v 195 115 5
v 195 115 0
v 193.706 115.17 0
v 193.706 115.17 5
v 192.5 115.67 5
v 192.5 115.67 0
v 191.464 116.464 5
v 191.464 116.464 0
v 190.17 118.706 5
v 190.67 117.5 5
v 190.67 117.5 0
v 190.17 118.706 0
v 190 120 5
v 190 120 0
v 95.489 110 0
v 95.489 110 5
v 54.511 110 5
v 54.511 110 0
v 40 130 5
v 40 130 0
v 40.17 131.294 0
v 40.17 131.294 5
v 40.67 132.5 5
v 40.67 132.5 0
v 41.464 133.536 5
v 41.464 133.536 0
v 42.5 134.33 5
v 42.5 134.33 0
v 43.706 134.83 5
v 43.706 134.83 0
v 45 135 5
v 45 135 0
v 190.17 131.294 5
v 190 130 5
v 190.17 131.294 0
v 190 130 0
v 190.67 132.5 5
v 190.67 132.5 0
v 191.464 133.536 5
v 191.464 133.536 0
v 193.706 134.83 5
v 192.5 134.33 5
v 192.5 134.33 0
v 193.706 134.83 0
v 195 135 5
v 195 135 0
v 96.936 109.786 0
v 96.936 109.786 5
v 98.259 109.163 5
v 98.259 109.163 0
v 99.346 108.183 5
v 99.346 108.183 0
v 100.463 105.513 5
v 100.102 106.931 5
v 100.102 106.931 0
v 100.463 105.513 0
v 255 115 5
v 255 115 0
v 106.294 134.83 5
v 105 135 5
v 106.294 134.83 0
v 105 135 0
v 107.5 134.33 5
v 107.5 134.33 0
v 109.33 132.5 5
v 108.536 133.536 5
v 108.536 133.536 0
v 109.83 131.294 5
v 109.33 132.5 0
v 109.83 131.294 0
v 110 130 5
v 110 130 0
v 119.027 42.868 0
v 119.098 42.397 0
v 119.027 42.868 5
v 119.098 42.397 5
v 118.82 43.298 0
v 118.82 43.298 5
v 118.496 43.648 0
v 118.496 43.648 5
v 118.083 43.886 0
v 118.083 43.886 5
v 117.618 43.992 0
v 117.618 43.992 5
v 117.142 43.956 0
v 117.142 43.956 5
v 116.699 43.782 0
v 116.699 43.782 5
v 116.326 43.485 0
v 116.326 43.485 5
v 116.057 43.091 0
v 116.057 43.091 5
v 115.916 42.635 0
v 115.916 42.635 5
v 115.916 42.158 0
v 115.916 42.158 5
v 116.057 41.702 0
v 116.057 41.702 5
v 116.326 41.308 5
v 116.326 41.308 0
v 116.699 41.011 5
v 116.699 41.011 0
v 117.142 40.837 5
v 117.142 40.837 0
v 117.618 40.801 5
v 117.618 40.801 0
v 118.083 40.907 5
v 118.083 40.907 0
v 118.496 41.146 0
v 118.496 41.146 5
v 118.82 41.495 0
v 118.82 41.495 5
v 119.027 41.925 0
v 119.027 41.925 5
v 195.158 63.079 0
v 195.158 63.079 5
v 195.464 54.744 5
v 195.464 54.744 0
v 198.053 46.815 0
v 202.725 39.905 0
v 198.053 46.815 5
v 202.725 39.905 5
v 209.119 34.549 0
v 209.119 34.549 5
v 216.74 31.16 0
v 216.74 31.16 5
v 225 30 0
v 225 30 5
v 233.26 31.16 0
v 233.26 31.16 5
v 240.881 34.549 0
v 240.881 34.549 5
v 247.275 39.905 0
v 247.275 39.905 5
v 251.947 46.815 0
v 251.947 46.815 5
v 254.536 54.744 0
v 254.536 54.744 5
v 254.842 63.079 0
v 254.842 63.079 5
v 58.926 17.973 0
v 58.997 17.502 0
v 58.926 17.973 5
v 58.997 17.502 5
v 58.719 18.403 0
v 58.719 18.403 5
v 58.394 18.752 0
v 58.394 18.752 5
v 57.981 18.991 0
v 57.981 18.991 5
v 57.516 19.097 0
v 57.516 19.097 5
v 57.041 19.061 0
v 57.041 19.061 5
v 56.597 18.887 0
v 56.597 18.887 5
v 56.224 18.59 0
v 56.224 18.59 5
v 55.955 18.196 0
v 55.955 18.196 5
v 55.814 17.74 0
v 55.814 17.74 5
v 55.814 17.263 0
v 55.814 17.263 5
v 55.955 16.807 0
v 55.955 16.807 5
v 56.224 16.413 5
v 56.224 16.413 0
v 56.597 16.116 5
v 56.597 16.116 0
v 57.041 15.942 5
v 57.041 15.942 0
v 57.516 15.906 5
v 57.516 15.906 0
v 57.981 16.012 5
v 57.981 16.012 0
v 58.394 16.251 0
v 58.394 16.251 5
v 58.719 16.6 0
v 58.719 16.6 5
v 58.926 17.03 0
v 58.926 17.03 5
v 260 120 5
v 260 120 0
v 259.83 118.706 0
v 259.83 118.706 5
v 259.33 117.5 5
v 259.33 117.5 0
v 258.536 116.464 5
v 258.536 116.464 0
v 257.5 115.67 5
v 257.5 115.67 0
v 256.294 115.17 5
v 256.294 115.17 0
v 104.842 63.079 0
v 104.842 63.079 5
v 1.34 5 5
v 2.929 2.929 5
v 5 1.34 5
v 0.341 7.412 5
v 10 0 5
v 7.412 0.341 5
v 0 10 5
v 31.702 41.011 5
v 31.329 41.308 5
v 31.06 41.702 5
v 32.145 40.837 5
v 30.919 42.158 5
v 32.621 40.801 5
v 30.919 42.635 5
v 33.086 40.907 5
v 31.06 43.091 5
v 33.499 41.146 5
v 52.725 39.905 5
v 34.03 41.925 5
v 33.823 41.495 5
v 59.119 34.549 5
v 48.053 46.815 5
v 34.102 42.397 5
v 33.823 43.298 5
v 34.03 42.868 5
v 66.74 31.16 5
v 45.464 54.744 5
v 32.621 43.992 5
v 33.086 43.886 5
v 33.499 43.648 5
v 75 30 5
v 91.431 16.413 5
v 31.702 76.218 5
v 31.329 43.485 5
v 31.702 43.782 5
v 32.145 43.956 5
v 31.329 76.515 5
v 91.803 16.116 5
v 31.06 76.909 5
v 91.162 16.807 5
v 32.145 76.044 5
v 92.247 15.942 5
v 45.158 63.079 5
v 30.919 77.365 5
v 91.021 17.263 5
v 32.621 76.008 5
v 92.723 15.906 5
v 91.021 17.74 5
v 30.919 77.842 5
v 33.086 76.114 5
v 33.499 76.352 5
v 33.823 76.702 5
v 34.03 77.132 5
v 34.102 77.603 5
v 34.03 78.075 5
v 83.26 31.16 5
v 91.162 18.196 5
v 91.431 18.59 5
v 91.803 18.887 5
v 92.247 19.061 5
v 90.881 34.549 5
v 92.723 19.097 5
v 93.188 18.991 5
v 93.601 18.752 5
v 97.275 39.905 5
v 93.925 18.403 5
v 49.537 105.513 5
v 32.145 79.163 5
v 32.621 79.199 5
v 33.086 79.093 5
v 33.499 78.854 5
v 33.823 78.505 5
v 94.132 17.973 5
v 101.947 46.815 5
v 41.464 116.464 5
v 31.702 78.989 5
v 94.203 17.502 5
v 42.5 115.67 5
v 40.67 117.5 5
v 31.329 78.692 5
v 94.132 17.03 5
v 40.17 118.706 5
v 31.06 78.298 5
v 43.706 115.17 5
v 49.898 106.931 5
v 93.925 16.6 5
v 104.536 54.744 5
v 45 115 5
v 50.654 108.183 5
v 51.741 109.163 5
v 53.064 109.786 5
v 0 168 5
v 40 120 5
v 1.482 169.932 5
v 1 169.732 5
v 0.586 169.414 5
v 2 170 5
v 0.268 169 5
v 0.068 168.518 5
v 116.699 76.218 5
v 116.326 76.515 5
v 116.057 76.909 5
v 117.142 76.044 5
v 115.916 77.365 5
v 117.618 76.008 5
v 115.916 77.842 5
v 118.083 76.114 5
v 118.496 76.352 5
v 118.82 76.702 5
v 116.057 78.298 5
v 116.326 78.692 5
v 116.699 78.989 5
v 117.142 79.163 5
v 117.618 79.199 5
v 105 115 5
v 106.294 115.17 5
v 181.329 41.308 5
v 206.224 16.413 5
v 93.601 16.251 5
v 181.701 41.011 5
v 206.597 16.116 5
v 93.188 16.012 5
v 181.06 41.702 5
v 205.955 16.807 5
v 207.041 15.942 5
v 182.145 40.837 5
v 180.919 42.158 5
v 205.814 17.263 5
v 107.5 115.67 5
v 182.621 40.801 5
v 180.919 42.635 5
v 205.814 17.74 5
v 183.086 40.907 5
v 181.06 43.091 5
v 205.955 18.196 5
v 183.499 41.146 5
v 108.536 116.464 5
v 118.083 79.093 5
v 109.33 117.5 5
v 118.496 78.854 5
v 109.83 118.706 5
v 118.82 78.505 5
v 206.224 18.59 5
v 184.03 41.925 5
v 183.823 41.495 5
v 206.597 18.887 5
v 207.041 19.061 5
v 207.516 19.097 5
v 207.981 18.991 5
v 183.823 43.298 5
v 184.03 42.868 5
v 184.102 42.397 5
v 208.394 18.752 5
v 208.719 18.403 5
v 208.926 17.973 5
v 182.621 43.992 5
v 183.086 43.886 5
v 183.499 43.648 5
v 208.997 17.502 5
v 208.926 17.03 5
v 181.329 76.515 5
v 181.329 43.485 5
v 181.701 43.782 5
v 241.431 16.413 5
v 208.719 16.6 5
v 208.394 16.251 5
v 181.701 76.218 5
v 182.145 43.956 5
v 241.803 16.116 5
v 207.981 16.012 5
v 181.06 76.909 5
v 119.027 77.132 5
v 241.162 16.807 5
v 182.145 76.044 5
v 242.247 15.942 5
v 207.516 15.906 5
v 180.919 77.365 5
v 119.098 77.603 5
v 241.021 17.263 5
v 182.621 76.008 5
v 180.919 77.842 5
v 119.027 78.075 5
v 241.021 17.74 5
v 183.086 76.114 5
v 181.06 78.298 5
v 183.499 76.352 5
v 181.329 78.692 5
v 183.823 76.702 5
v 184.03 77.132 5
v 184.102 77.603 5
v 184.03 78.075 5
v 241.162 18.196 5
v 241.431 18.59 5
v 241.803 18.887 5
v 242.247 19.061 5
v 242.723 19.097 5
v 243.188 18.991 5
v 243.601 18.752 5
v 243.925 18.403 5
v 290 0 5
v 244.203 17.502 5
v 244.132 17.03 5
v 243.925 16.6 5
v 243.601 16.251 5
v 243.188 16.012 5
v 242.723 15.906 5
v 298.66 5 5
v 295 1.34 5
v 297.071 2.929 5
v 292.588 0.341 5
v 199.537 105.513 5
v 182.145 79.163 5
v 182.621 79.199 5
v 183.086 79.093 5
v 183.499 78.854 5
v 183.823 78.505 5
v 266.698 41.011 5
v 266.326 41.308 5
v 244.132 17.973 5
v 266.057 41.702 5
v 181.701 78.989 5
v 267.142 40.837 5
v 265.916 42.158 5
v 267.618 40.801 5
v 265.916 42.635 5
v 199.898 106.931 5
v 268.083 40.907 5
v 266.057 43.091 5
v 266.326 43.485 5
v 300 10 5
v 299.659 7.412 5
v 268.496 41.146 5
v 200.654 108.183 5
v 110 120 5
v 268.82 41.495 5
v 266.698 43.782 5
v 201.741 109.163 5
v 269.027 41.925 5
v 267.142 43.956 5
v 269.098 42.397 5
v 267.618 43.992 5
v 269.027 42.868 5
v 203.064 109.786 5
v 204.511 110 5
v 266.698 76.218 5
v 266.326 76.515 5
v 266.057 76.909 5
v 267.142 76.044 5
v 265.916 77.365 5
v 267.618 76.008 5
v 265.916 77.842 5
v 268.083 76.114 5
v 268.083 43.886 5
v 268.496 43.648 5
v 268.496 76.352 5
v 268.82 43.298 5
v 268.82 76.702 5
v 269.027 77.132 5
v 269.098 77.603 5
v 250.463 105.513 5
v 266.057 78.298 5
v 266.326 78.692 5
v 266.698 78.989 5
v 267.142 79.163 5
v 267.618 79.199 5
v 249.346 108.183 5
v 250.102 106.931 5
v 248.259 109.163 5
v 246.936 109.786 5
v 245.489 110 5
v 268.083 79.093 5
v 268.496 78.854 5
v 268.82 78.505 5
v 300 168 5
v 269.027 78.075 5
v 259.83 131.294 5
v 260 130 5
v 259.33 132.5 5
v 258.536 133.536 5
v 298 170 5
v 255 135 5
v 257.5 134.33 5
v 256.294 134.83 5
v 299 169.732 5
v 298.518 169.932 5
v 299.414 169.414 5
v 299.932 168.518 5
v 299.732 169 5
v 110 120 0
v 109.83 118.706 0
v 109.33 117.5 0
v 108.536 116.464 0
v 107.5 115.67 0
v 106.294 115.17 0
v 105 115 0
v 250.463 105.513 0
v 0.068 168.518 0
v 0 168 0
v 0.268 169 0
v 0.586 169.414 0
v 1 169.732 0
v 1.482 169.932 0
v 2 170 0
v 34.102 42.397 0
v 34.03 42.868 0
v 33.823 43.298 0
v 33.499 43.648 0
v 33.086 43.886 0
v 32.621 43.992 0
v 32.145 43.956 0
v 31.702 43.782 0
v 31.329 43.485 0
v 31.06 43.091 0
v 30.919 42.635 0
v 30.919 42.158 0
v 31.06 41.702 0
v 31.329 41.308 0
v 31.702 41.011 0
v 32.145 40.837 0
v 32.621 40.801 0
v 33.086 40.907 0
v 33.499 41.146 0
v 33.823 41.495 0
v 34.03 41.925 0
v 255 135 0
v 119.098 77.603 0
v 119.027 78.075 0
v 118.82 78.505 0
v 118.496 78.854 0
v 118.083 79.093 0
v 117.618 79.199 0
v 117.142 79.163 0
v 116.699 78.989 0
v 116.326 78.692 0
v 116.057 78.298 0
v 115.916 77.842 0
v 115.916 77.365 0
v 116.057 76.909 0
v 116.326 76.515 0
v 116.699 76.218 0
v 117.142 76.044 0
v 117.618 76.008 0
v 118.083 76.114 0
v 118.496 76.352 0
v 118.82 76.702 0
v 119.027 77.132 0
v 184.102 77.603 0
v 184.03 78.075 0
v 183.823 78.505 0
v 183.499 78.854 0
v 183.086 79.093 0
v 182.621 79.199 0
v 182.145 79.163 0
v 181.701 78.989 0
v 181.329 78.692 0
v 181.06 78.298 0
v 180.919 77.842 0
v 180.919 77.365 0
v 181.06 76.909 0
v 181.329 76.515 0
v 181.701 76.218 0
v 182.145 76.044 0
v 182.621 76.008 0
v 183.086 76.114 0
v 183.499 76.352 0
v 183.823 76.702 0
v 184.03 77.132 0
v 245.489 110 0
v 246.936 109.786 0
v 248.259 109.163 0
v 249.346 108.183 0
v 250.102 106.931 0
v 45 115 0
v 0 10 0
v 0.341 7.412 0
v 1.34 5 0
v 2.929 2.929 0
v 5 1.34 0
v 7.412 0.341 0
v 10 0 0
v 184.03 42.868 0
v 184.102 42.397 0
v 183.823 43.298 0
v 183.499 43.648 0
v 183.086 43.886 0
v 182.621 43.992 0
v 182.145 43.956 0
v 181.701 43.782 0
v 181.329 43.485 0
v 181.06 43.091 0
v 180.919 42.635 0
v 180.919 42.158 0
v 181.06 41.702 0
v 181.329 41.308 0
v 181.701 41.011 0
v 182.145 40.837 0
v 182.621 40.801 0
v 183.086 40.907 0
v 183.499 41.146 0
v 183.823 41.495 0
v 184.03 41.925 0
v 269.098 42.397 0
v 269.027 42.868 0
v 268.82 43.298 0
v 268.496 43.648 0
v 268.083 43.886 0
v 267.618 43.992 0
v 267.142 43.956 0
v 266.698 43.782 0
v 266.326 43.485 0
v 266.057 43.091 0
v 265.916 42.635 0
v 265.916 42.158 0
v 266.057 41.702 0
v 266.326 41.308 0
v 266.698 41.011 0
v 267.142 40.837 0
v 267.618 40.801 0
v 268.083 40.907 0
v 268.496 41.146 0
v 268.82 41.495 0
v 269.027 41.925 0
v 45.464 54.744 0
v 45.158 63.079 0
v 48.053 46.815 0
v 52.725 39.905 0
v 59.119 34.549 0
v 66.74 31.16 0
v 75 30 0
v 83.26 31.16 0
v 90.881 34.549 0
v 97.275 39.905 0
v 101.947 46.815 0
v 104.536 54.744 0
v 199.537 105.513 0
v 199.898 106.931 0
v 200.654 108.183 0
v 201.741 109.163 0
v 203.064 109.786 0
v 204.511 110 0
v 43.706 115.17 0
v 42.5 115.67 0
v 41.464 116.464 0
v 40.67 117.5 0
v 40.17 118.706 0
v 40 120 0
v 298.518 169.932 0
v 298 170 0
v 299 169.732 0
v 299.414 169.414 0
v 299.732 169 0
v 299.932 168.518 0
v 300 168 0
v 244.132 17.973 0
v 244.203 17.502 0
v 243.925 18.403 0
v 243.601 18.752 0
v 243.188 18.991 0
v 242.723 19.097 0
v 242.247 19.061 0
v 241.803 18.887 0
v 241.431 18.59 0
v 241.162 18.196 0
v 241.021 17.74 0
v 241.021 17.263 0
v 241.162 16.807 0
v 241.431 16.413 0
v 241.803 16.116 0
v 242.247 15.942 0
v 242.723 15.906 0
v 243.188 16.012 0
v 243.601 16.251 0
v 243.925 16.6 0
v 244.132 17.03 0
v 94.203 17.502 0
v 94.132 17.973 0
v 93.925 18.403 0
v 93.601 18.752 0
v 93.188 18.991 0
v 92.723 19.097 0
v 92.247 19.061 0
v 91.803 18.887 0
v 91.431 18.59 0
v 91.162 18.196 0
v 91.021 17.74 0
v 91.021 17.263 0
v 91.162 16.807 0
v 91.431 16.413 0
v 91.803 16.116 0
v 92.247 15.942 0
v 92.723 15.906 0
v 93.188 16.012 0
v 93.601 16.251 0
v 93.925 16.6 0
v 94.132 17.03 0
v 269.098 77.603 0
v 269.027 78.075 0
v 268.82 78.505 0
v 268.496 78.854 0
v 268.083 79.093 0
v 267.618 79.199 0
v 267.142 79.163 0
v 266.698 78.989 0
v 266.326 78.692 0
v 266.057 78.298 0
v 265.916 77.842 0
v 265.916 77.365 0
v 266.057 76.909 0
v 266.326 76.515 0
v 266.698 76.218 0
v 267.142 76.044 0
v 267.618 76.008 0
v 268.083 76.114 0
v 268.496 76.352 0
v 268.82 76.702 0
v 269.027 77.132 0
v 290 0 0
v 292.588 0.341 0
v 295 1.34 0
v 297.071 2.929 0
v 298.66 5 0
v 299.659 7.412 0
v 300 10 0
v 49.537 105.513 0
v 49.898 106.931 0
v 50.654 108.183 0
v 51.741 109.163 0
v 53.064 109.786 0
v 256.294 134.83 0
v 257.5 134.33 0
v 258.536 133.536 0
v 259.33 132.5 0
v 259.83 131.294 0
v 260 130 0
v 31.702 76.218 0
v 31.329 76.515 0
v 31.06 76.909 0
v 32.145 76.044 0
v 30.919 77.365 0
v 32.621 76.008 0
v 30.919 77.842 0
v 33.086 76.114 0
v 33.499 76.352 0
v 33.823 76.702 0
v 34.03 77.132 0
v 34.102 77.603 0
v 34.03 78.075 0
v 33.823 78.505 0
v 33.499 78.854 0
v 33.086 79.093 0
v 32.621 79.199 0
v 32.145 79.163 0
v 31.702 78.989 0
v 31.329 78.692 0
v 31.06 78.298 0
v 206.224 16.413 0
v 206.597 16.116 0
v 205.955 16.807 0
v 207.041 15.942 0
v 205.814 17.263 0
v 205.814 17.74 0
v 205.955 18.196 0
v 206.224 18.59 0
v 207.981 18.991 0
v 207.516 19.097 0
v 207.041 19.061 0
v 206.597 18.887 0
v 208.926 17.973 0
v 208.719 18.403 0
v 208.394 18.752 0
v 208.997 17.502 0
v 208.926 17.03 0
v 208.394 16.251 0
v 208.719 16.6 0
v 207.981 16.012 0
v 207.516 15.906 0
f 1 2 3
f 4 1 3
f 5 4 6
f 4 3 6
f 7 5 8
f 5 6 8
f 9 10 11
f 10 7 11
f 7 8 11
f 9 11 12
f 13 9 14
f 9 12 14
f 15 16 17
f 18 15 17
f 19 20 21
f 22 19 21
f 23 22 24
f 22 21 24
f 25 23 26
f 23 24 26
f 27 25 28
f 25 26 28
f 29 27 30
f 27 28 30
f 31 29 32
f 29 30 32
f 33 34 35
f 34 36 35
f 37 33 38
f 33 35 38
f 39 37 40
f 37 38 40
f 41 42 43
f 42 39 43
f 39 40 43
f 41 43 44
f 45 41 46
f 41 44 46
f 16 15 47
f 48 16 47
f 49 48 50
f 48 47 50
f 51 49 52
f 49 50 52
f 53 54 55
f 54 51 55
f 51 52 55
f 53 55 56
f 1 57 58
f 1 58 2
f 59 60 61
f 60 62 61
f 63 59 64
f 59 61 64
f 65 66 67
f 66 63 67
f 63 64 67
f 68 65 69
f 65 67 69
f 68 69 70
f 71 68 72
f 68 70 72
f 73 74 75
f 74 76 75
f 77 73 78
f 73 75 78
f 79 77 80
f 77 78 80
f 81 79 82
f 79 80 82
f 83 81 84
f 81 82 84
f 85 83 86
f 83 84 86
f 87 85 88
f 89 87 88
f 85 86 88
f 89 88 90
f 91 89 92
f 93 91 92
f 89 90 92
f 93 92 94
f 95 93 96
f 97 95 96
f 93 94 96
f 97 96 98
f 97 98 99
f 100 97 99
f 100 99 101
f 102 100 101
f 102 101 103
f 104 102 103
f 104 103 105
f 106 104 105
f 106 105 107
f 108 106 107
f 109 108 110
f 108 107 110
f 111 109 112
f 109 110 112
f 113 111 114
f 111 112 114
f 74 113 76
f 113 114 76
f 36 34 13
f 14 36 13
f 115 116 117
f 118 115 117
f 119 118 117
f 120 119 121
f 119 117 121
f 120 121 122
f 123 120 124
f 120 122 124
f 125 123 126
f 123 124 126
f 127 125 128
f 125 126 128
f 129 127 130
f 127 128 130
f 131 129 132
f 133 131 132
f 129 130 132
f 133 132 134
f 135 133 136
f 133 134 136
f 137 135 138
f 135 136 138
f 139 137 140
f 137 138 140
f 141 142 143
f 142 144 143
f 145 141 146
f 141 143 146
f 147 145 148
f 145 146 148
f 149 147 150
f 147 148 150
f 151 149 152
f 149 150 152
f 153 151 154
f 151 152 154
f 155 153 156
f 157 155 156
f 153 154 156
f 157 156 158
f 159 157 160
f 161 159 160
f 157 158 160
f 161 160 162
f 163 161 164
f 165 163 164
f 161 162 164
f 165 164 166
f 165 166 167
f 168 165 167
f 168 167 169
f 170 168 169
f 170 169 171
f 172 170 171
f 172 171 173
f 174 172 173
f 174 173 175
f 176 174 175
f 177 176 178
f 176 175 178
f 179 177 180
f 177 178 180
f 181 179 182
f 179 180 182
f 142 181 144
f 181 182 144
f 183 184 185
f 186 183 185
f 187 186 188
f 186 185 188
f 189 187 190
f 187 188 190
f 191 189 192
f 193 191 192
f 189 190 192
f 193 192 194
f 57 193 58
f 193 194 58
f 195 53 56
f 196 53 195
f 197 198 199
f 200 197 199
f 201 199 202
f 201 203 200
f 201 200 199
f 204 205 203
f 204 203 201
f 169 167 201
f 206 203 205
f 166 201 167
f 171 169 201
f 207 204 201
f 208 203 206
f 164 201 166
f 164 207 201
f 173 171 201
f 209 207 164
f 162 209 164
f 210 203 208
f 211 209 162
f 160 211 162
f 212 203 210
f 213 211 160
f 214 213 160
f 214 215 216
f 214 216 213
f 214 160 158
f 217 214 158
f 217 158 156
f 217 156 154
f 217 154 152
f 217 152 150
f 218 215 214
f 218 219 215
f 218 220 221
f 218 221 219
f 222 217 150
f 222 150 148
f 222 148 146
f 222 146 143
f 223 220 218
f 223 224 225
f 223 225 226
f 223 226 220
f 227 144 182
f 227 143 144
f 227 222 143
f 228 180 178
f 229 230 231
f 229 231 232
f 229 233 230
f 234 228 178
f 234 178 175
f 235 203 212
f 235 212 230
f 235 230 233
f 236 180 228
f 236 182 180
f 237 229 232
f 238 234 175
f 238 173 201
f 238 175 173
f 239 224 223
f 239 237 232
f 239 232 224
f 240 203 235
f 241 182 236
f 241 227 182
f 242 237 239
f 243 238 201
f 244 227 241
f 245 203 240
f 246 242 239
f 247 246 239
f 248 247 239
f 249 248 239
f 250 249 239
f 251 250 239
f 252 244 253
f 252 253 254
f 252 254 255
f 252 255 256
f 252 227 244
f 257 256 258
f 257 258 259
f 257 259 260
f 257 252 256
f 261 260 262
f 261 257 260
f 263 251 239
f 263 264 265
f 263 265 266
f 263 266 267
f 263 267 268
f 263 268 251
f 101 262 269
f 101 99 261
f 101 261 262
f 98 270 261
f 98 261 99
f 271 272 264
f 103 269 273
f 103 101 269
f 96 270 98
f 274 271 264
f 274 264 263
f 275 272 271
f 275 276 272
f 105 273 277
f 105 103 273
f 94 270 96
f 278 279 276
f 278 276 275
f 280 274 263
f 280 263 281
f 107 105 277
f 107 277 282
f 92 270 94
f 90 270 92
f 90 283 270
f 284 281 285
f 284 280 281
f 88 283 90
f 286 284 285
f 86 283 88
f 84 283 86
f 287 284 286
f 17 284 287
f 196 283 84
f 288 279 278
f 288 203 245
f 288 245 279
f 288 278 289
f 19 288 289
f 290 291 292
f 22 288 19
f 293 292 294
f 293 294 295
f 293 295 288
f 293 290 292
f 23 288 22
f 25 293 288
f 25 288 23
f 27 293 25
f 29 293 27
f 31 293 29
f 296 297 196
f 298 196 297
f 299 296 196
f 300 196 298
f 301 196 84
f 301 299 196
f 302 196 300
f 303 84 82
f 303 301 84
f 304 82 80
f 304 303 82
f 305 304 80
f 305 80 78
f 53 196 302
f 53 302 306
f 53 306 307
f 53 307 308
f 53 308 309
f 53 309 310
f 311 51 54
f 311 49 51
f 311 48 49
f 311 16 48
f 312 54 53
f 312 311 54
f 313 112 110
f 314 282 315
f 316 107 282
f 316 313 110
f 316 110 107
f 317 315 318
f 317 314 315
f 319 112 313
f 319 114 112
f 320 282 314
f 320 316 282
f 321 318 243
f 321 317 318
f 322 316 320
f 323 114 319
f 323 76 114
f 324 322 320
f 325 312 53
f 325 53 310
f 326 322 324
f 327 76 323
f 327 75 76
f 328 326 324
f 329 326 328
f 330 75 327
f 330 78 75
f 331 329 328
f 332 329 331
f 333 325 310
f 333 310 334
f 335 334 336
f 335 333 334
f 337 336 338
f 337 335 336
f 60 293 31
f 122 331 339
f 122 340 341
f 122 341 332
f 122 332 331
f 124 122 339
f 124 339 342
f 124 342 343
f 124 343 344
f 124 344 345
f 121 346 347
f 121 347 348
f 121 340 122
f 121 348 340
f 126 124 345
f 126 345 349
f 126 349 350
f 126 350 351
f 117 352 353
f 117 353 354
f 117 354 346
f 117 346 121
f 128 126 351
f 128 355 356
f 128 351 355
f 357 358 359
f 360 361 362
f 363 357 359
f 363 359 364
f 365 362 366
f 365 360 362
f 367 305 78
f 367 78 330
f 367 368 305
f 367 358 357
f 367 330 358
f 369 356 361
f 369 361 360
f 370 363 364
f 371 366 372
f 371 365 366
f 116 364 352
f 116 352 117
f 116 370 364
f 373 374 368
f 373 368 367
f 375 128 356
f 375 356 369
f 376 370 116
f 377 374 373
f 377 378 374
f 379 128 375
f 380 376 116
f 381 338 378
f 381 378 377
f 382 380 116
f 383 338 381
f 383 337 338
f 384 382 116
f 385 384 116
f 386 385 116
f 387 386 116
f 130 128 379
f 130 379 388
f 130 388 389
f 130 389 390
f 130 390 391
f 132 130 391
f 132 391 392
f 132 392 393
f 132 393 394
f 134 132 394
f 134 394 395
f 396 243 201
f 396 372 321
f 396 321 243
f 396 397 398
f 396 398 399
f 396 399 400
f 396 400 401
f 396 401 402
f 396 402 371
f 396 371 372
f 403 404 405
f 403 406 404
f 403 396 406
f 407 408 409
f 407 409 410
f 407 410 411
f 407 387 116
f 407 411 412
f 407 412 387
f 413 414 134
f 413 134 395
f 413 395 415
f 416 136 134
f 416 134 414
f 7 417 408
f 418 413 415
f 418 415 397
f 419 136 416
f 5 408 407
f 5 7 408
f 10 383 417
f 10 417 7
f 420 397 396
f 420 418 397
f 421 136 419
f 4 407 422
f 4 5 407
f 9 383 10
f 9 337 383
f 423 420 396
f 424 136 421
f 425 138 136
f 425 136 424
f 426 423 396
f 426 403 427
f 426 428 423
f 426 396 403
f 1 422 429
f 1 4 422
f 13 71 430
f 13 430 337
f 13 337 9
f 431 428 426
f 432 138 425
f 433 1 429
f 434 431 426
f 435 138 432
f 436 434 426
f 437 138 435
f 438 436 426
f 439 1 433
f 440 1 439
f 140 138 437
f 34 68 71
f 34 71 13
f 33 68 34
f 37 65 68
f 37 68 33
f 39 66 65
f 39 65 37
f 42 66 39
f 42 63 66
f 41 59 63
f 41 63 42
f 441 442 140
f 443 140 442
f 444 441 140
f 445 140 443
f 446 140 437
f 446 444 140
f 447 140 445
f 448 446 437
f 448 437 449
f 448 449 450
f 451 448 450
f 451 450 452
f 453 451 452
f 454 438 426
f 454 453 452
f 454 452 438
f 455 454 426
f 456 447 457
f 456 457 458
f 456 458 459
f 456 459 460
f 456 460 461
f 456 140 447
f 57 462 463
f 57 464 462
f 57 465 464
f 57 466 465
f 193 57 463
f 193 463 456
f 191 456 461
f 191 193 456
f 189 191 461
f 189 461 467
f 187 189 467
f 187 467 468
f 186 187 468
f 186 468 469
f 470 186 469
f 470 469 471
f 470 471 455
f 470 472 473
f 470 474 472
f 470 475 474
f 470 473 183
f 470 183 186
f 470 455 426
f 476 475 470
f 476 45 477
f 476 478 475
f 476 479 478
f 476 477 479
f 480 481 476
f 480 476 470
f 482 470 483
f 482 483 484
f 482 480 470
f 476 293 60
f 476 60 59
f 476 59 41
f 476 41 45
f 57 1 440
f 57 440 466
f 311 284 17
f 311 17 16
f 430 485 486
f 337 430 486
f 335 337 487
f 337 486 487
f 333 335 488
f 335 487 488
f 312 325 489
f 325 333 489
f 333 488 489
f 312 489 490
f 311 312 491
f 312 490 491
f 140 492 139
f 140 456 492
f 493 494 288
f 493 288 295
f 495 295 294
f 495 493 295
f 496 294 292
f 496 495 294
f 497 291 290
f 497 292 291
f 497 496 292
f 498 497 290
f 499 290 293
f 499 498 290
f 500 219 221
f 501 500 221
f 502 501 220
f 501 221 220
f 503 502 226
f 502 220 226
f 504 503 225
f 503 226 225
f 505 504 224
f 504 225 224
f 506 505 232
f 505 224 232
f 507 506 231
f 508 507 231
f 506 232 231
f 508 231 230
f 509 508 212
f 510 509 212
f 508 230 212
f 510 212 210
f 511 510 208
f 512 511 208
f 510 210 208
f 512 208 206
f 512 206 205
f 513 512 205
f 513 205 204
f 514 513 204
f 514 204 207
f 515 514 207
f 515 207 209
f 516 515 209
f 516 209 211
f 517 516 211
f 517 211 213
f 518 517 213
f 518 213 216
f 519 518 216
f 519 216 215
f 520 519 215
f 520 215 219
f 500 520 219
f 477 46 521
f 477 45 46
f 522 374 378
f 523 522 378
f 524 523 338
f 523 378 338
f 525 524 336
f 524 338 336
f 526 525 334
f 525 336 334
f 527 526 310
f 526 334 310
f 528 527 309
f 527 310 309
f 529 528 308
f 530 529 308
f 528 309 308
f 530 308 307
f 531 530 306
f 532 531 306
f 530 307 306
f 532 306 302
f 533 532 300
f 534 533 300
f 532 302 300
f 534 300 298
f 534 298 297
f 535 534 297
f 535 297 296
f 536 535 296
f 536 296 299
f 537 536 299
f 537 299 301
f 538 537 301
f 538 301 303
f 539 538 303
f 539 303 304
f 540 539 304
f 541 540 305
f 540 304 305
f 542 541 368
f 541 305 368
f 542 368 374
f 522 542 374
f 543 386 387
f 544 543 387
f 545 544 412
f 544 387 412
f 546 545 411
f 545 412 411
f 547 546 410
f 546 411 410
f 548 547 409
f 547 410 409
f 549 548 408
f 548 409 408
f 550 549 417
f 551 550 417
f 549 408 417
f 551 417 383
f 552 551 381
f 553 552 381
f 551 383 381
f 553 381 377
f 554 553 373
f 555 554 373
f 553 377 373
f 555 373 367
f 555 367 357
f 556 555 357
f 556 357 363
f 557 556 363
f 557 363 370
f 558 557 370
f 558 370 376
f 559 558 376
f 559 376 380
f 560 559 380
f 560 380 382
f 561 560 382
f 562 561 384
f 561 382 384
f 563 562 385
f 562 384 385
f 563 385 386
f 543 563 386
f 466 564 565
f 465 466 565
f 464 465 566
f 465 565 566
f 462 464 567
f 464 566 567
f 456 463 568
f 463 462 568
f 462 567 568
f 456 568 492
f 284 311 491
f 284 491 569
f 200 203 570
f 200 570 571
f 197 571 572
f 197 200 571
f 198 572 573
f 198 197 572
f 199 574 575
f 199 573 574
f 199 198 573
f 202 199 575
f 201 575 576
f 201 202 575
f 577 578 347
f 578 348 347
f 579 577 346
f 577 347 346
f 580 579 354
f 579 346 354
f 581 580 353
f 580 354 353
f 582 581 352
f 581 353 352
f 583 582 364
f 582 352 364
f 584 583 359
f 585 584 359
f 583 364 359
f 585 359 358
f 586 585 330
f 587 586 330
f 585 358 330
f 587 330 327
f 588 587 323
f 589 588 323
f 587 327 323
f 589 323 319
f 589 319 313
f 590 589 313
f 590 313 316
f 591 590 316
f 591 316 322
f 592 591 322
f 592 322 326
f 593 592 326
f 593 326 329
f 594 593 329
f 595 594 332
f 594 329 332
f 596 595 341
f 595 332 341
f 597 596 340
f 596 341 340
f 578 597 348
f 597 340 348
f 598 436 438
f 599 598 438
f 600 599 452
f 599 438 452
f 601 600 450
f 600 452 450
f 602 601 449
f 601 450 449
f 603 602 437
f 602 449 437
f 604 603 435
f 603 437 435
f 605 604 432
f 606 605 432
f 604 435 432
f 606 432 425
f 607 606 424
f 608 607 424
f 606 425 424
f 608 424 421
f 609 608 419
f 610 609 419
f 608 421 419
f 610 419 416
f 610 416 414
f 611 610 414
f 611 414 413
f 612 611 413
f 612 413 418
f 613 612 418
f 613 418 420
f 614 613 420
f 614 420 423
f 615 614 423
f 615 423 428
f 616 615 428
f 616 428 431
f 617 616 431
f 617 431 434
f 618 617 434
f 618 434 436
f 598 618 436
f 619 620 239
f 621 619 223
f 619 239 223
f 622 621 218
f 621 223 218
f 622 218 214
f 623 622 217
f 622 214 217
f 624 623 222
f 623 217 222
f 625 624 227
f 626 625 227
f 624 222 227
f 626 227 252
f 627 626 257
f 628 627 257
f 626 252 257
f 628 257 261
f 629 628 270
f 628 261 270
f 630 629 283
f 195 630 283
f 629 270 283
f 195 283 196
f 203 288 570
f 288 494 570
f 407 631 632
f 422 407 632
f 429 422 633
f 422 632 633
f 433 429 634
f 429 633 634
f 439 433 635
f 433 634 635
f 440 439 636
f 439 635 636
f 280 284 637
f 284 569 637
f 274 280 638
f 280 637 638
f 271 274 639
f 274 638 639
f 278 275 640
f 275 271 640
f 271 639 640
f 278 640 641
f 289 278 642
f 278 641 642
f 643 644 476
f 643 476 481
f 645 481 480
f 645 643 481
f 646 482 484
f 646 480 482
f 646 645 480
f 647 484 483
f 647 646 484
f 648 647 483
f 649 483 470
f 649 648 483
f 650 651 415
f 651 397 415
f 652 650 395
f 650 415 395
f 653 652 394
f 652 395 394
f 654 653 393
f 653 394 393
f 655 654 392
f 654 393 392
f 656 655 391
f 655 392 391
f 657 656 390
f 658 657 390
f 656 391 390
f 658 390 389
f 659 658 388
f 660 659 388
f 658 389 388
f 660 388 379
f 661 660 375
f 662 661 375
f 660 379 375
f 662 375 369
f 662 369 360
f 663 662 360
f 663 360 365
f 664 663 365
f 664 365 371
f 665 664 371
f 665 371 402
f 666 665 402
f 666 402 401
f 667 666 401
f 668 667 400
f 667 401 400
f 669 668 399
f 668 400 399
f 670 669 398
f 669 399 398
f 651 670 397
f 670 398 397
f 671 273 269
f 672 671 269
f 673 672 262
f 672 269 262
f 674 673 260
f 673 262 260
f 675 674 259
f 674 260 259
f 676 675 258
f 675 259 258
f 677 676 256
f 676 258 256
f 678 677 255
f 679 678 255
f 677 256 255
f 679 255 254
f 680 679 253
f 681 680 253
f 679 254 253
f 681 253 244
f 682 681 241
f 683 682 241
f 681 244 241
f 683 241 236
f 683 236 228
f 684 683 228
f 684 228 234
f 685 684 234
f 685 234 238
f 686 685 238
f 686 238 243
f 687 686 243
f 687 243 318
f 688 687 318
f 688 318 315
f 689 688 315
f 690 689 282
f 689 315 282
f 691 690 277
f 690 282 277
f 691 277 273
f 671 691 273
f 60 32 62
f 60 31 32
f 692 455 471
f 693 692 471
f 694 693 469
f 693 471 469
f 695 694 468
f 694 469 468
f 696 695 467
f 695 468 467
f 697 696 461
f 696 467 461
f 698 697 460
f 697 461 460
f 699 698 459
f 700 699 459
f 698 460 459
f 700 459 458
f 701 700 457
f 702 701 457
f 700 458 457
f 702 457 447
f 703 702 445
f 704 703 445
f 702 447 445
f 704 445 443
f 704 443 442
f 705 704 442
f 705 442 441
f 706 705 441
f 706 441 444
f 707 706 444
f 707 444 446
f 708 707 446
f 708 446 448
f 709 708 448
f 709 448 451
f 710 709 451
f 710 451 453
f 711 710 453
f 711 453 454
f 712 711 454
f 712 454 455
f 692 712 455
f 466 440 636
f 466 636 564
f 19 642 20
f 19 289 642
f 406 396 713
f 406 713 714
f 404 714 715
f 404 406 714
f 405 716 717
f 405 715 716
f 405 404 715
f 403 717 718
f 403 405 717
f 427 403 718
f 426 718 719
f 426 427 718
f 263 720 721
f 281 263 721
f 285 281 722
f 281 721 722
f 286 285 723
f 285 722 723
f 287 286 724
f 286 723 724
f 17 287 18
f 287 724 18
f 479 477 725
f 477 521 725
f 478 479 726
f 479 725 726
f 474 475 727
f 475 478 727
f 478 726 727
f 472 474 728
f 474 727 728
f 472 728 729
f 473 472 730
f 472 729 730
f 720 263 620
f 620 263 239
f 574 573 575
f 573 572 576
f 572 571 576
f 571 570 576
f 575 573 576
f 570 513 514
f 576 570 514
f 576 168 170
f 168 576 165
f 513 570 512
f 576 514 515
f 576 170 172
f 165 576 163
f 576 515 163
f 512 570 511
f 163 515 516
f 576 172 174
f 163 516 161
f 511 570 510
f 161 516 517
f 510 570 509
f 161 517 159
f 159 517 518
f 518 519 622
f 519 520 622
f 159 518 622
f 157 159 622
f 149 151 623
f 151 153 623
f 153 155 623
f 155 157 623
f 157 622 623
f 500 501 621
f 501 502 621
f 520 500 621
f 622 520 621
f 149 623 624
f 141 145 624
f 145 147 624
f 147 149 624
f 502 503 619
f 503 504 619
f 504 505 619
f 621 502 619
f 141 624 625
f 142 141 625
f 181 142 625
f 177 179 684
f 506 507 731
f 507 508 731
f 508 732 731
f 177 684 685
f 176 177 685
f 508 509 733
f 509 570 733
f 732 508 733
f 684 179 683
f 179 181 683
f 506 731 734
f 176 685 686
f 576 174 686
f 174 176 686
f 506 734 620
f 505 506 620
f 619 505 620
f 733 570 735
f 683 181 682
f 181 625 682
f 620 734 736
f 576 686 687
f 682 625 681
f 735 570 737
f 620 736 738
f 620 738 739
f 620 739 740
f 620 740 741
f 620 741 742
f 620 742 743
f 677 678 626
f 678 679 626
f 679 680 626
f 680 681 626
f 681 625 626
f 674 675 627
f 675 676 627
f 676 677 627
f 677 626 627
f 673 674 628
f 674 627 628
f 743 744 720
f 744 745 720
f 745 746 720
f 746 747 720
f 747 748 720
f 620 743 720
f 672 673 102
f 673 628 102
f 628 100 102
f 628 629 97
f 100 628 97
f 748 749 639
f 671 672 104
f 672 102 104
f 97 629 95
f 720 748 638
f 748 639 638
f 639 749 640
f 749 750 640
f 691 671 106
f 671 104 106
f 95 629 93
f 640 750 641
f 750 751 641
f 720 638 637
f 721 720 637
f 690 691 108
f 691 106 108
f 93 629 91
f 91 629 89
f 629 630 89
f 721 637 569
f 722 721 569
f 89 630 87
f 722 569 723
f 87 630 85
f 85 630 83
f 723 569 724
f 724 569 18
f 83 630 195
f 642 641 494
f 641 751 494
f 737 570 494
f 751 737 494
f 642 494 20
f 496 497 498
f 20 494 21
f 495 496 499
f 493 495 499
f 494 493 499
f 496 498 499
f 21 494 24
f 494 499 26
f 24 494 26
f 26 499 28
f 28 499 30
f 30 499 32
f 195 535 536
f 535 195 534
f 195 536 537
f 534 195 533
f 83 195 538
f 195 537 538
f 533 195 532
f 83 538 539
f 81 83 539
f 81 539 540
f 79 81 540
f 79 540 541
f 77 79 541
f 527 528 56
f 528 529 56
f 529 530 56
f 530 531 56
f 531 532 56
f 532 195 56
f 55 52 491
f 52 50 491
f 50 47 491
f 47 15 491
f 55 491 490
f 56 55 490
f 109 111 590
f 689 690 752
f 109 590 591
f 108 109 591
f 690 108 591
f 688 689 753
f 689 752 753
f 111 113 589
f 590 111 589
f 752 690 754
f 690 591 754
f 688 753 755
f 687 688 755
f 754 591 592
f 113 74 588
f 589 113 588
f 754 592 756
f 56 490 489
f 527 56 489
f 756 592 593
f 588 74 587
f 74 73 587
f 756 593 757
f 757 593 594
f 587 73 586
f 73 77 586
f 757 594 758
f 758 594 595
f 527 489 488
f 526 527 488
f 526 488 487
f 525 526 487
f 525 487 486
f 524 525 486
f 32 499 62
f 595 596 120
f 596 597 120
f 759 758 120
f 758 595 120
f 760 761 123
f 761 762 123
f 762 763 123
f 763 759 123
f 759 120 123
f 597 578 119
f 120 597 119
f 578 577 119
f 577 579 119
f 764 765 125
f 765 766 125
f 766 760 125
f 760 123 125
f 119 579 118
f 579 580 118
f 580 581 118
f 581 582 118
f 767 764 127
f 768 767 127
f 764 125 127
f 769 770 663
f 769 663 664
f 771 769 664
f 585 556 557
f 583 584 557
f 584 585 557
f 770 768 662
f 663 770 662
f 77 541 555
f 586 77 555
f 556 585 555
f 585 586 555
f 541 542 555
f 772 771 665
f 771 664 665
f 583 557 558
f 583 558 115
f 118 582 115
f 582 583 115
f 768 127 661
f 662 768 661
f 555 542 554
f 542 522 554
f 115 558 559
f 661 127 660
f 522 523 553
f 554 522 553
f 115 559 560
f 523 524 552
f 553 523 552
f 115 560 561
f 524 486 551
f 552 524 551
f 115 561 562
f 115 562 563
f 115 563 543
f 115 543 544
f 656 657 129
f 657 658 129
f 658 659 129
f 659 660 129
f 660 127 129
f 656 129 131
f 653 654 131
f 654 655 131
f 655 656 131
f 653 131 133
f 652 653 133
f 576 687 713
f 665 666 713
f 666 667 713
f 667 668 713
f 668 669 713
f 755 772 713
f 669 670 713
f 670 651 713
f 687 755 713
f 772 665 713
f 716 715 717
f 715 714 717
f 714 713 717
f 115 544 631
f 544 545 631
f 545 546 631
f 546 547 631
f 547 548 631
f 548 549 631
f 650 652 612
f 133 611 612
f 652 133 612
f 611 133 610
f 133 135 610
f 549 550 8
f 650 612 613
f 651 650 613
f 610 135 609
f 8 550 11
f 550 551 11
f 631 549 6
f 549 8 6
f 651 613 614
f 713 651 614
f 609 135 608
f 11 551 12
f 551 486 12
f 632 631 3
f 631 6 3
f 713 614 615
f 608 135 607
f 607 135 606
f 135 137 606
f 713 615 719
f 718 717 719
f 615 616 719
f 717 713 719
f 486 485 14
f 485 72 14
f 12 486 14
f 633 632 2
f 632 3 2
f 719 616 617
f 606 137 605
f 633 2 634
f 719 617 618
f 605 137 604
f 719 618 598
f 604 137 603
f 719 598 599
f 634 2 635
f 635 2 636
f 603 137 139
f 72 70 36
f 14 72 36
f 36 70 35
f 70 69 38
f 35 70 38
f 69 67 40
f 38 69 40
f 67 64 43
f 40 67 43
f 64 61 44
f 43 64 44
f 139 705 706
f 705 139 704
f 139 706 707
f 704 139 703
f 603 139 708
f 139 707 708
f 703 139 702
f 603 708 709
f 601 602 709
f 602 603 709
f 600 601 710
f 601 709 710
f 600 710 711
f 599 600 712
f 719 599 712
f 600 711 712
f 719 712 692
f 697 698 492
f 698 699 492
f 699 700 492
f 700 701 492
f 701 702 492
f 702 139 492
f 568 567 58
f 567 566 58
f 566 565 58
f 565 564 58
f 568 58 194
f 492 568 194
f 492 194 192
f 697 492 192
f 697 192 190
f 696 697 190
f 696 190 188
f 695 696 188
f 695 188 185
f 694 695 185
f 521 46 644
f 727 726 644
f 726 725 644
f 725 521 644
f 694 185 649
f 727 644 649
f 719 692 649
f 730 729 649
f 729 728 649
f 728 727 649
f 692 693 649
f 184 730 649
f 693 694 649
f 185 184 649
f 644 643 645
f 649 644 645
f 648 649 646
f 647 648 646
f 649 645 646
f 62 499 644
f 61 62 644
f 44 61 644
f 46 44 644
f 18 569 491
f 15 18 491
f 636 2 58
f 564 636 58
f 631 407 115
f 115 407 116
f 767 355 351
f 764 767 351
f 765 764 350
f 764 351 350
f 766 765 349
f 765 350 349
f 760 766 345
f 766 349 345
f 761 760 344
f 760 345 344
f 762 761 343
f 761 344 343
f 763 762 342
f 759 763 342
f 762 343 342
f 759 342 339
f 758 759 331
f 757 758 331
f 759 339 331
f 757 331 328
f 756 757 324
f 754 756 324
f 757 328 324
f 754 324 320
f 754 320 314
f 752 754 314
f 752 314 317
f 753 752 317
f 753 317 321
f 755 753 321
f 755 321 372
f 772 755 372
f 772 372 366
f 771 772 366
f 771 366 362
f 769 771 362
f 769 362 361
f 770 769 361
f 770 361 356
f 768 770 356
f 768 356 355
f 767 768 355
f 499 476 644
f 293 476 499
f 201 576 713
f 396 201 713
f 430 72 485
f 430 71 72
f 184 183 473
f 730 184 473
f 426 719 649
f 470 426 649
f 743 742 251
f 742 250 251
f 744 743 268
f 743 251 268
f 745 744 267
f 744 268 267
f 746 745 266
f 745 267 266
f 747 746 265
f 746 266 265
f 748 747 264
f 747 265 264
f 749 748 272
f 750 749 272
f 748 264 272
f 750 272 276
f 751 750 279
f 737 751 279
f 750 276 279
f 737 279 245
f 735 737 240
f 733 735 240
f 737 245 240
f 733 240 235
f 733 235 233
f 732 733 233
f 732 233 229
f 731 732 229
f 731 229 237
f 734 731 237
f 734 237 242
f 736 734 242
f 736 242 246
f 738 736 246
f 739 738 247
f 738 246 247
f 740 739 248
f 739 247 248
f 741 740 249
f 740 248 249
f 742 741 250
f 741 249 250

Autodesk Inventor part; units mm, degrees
ref_plane "YZ Plane" through (0, 0, 0) normal (1, 0, 0) x (0, 1, 0)
ref_plane "XZ Plane" through (0, 0, 0) normal (0, 1, 0) x (-1, 0, 0)
ref_plane "XY Plane" through (0, 0, 0) normal (0, 0, 1) x (1, 0, 0)
sketch "スケッチ1" plane through (0, 0, 0) normal (0, 0, 1) x (1, 0, 0)
  line L0 (0, 0) -> (300, 0)
  line L1 (300, 0) -> (300, 175)
  line L2 (300, 175) -> (0, 175)
  line L3 (0, 175) -> (0, 0)
  dimension "d0" = 175
  dimension "d1" = 300
extrude "押し出し1" add sketch "スケッチ1" along normal blind 5
sketch "スケッチ2" plane through (0, 0, 5) normal (0, 0, 1) x (1, 0, 0)
  line L0 (-6.3861, 0) -> (323.6139, 0)
  circle A0 centre (75, 60) radius 46
  circle A1 centre (225, 60) radius 46
  line L1 (75, 60) -> (75, 156.1238)
  line L2 (225, 60) -> (225, 147.3766)
  line L3 (75, 60) -> (50.2691, 119.7057)
  line L4 (225, 60) -> (203.3576, 112.2494)
  circle A2 centre (57.3966, 102.4985) radius 1.6
  circle A3 centre (207.3966, 102.4985) radius 1.6
  circle A4 centre (32.5015, 77.6034) radius 1.6
  circle A5 centre (32.5015, 42.3966) radius 1.6
  circle A6 centre (57.3966, 17.5015) radius 1.6
  circle A7 centre (92.6034, 17.5015) radius 1.6
  circle A8 centre (117.4985, 42.3966) radius 1.6
  circle A9 centre (117.4985, 77.6034) radius 1.6
  circle A10 centre (92.6034, 102.4985) radius 1.6
  circle A11 centre (182.5015, 77.6034) radius 1.6
  circle A12 centre (182.5015, 42.3966) radius 1.6
  circle A13 centre (207.3966, 17.5015) radius 1.6
  circle A14 centre (242.6034, 17.5015) radius 1.6
  circle A15 centre (267.4985, 42.3966) radius 1.6
  circle A16 centre (267.4985, 77.6034) radius 1.6
  circle A17 centre (242.6034, 102.4985) radius 1.6
  circle A18 centre (75, 60) radius 30
  circle A19 centre (225, 60) radius 30
  line L5 (323.6139, 175) -> (-6.3861, 175)
  line L6 (-6.3861, 145) -> (19.1813, 0)
  line L7 (323.6139, 145) -> (298.0465, 0)
  line L8 (0, 175) -> (0, 0)
  line L9 (300, 175) -> (300, 0)
  line L10 (300, 175) -> (0, 175) projected
  line L11 (0, 175) -> (0, 0) projected
  dimension "d10" = 92
  dimension "d11" = 92
  dimension "d8" = 60
  dimension "d9" = 60
  dimension "d12" = 22.5
  dimension "d13" = 22.5
  dimension "d14" = 3.2
  dimension "d15" = 3.2
  dimension "d16" = 360
  dimension "d17" = 360
  dimension "d18" = 60
  dimension "d19" = 60
  dimension "d20" = 175
  dimension "d21" = 30
  dimension "d22" = 30
  dimension "d23" = 80
  dimension "d24" = 80
  dimension "d25" = 300
  dimension "d26" = 0
  dimension "d27" = 0
  dimension "d28" = 150
  dimension "d29" = 75
extrude "押し出し2" cut sketch "スケッチ2" against normal blind 5 contours A9 A0 | A0 A9 | A8 A0 | A0 A8 | A7 A0 | A0 A7 | A6 A0 | A0 A6 | A18 L3 L1 | L1 L3 A18 | A5 A0 | A0 A5 | A4 A0 | A0 A4 | A16 A1 | A1 A16 | A15 A1 | A1 A15 | A14 A1 | A1 A14 | A13 A1 | A1 A13 | A19 L4 L2 | L2 L4 A19 | A12 A1 | A1 A12 | A11 A1 | A1 A11
sketch "スケッチ3" plane through (0, 0, 5) normal (0, 0, 1) x (1, 0, 0)
  circle A0 centre (75, 60) radius 30 projected
  line L0 (75, 60) -> (100, 60)
  line L1 (100, 60) -> (100, 110)
  line L2 (100, 110) -> (75, 110)
  line L3 (75, 110) -> (75, 60)
  line L4 (75, 110) -> (50, 110)
  line L5 (50, 110) -> (50, 60)
  line L6 (50, 60) -> (75, 60)
  line L7 (75, 60) -> (75, 110)
  line L8 (50, 110) -> (42.3811, 36.1629)
  line L9 (100, 110) -> (107.6189, 36.1629)
  line L10 (300, 175) -> (0, 175) projected
  line L11 (150, 175) -> (150, 0)
  line L12 (0, 0) -> (300, 0) projected
  line L13 (200, 110) -> (225, 110)
  line L14 (225, 110) -> (250, 110)
  line L15 (250, 110) -> (257.6189, 36.1629)
  line L16 (200, 110) -> (192.3811, 36.1629)
  circle A1 centre (225, 60) radius 30 projected
  circle A2 centre (225, 60) radius 30
  point P0 (45.1584, 63.0792)
  point P1 (104.8416, 63.0792)
  point P2 (195.1584, 63.0792)
  point P3 (254.8416, 63.0792)
  dimension "d32" = 25
  dimension "d33" = 50
  dimension "d34" = 25
extrude "押し出し3" cut sketch "スケッチ3" against normal blind 5 contours A0 L1 L9 | L8 L5 A0 | A0 L3 L2 L1 | L5 L4 L3 A0 | L13 L14 L15 A1 L16
sketch "スケッチ4" plane through (0, 0, 5) normal (0, 0, 1) x (1, 0, 0)
  line L0 (0, 175) -> (0, 0) projected
  line L1 (300, 0) -> (300, 175) projected
  line L2 (0, 175) -> (300, 175)
  line L3 (300, 175) -> (300, 110)
  line L4 (300, 110) -> (0, 110)
  line L5 (0, 110) -> (0, 175)
  line L6 (0, 135) -> (300, 135)
  line L7 (300, 135) -> (300, 115)
  line L8 (300, 115) -> (0, 115)
  line L9 (0, 115) -> (0, 135)
  line L10 (40, 135) -> (110, 135)
  line L11 (110, 135) -> (110, 115)
  line L12 (110, 115) -> (40, 115)
  line L13 (40, 115) -> (40, 135)
  line L14 (150, 115) -> (150, 0)
  line L15 (190, 135) -> (190, 115)
  line L16 (260, 115) -> (260, 135)
  dimension "d38" = 65
  dimension "d39" = 20
  dimension "d40" = 5
  dimension "d41" = 70
  dimension "d192" = 40
extrude "押し出し4" cut sketch "スケッチ4" against normal blind 5 contours L6 L11 L8 L13 | L16 L8 L15 L6
fillet "フィレット2" radius 5 12 edges at (110, 135, 2.5) (260, 135, 2.5) (260, 115, 2.5) (190, 135, 2.5) (190, 115, 2.5) (40, 115, 2.5) (40, 135, 2.5) (110, 115, 2.5) (100, 110, 2.5) (250, 110, 2.5) (200, 110, 2.5) (50, 110, 2.5)
sketch "スケッチ5" plane through (0, 0, 5) normal (0, 0, 1) x (1, 0, 0)
  line L0 (300, 175) -> (0, 175) projected
  line L1 (300, 0) -> (300, 175) projected
  line L2 (0, 175) -> (300, 175)
  line L3 (300, 175) -> (300, 170)
  line L4 (300, 170) -> (0, 170)
  line L5 (0, 170) -> (0, 175)
  line L6 (20, 175) -> (20, 170)
  line L7 (40, 175) -> (40, 170)
  line L8 (60, 175) -> (60, 170)
  line L9 (80, 175) -> (80, 170)
  line L10 (100, 175) -> (100, 170)
  line L11 (120, 175) -> (120, 170)
  line L12 (140, 175) -> (140, 170)
  line L13 (160, 175) -> (160, 170)
  line L14 (180, 175) -> (180, 170)
  line L15 (200, 175) -> (200, 170)
  line L16 (220, 175) -> (220, 170)
  line L17 (240, 175) -> (240, 170)
  line L18 (260, 175) -> (260, 170)
  line L19 (280, 175) -> (280, 170)
  line L20 (300, 175) -> (300, 170)
  point P0 (0, 0)
  point P1 (0, 172.5)
  dimension "d46" = 5
  dimension "d47" = 20
  dimension "d50" = 20
extrude "押し出し5" cut sketch "スケッチ5" against normal blind 5
fillet "フィレット6" radius 10 2 edges at (0, 0, 2.5) (300, 0, 2.5)
fillet "フィレット7" radius 2 2 edges at (300, 170, 2.5) (0, 170, 2.5)
equation "\"d11\" = d10"
equation "\"d8\" = d9"
equation "\"d15\" = d14"
equation "\"d24\" = d23"
equation "\"d34\" = d32"
properties part number "RP_Waist-Under" material "A5052"
